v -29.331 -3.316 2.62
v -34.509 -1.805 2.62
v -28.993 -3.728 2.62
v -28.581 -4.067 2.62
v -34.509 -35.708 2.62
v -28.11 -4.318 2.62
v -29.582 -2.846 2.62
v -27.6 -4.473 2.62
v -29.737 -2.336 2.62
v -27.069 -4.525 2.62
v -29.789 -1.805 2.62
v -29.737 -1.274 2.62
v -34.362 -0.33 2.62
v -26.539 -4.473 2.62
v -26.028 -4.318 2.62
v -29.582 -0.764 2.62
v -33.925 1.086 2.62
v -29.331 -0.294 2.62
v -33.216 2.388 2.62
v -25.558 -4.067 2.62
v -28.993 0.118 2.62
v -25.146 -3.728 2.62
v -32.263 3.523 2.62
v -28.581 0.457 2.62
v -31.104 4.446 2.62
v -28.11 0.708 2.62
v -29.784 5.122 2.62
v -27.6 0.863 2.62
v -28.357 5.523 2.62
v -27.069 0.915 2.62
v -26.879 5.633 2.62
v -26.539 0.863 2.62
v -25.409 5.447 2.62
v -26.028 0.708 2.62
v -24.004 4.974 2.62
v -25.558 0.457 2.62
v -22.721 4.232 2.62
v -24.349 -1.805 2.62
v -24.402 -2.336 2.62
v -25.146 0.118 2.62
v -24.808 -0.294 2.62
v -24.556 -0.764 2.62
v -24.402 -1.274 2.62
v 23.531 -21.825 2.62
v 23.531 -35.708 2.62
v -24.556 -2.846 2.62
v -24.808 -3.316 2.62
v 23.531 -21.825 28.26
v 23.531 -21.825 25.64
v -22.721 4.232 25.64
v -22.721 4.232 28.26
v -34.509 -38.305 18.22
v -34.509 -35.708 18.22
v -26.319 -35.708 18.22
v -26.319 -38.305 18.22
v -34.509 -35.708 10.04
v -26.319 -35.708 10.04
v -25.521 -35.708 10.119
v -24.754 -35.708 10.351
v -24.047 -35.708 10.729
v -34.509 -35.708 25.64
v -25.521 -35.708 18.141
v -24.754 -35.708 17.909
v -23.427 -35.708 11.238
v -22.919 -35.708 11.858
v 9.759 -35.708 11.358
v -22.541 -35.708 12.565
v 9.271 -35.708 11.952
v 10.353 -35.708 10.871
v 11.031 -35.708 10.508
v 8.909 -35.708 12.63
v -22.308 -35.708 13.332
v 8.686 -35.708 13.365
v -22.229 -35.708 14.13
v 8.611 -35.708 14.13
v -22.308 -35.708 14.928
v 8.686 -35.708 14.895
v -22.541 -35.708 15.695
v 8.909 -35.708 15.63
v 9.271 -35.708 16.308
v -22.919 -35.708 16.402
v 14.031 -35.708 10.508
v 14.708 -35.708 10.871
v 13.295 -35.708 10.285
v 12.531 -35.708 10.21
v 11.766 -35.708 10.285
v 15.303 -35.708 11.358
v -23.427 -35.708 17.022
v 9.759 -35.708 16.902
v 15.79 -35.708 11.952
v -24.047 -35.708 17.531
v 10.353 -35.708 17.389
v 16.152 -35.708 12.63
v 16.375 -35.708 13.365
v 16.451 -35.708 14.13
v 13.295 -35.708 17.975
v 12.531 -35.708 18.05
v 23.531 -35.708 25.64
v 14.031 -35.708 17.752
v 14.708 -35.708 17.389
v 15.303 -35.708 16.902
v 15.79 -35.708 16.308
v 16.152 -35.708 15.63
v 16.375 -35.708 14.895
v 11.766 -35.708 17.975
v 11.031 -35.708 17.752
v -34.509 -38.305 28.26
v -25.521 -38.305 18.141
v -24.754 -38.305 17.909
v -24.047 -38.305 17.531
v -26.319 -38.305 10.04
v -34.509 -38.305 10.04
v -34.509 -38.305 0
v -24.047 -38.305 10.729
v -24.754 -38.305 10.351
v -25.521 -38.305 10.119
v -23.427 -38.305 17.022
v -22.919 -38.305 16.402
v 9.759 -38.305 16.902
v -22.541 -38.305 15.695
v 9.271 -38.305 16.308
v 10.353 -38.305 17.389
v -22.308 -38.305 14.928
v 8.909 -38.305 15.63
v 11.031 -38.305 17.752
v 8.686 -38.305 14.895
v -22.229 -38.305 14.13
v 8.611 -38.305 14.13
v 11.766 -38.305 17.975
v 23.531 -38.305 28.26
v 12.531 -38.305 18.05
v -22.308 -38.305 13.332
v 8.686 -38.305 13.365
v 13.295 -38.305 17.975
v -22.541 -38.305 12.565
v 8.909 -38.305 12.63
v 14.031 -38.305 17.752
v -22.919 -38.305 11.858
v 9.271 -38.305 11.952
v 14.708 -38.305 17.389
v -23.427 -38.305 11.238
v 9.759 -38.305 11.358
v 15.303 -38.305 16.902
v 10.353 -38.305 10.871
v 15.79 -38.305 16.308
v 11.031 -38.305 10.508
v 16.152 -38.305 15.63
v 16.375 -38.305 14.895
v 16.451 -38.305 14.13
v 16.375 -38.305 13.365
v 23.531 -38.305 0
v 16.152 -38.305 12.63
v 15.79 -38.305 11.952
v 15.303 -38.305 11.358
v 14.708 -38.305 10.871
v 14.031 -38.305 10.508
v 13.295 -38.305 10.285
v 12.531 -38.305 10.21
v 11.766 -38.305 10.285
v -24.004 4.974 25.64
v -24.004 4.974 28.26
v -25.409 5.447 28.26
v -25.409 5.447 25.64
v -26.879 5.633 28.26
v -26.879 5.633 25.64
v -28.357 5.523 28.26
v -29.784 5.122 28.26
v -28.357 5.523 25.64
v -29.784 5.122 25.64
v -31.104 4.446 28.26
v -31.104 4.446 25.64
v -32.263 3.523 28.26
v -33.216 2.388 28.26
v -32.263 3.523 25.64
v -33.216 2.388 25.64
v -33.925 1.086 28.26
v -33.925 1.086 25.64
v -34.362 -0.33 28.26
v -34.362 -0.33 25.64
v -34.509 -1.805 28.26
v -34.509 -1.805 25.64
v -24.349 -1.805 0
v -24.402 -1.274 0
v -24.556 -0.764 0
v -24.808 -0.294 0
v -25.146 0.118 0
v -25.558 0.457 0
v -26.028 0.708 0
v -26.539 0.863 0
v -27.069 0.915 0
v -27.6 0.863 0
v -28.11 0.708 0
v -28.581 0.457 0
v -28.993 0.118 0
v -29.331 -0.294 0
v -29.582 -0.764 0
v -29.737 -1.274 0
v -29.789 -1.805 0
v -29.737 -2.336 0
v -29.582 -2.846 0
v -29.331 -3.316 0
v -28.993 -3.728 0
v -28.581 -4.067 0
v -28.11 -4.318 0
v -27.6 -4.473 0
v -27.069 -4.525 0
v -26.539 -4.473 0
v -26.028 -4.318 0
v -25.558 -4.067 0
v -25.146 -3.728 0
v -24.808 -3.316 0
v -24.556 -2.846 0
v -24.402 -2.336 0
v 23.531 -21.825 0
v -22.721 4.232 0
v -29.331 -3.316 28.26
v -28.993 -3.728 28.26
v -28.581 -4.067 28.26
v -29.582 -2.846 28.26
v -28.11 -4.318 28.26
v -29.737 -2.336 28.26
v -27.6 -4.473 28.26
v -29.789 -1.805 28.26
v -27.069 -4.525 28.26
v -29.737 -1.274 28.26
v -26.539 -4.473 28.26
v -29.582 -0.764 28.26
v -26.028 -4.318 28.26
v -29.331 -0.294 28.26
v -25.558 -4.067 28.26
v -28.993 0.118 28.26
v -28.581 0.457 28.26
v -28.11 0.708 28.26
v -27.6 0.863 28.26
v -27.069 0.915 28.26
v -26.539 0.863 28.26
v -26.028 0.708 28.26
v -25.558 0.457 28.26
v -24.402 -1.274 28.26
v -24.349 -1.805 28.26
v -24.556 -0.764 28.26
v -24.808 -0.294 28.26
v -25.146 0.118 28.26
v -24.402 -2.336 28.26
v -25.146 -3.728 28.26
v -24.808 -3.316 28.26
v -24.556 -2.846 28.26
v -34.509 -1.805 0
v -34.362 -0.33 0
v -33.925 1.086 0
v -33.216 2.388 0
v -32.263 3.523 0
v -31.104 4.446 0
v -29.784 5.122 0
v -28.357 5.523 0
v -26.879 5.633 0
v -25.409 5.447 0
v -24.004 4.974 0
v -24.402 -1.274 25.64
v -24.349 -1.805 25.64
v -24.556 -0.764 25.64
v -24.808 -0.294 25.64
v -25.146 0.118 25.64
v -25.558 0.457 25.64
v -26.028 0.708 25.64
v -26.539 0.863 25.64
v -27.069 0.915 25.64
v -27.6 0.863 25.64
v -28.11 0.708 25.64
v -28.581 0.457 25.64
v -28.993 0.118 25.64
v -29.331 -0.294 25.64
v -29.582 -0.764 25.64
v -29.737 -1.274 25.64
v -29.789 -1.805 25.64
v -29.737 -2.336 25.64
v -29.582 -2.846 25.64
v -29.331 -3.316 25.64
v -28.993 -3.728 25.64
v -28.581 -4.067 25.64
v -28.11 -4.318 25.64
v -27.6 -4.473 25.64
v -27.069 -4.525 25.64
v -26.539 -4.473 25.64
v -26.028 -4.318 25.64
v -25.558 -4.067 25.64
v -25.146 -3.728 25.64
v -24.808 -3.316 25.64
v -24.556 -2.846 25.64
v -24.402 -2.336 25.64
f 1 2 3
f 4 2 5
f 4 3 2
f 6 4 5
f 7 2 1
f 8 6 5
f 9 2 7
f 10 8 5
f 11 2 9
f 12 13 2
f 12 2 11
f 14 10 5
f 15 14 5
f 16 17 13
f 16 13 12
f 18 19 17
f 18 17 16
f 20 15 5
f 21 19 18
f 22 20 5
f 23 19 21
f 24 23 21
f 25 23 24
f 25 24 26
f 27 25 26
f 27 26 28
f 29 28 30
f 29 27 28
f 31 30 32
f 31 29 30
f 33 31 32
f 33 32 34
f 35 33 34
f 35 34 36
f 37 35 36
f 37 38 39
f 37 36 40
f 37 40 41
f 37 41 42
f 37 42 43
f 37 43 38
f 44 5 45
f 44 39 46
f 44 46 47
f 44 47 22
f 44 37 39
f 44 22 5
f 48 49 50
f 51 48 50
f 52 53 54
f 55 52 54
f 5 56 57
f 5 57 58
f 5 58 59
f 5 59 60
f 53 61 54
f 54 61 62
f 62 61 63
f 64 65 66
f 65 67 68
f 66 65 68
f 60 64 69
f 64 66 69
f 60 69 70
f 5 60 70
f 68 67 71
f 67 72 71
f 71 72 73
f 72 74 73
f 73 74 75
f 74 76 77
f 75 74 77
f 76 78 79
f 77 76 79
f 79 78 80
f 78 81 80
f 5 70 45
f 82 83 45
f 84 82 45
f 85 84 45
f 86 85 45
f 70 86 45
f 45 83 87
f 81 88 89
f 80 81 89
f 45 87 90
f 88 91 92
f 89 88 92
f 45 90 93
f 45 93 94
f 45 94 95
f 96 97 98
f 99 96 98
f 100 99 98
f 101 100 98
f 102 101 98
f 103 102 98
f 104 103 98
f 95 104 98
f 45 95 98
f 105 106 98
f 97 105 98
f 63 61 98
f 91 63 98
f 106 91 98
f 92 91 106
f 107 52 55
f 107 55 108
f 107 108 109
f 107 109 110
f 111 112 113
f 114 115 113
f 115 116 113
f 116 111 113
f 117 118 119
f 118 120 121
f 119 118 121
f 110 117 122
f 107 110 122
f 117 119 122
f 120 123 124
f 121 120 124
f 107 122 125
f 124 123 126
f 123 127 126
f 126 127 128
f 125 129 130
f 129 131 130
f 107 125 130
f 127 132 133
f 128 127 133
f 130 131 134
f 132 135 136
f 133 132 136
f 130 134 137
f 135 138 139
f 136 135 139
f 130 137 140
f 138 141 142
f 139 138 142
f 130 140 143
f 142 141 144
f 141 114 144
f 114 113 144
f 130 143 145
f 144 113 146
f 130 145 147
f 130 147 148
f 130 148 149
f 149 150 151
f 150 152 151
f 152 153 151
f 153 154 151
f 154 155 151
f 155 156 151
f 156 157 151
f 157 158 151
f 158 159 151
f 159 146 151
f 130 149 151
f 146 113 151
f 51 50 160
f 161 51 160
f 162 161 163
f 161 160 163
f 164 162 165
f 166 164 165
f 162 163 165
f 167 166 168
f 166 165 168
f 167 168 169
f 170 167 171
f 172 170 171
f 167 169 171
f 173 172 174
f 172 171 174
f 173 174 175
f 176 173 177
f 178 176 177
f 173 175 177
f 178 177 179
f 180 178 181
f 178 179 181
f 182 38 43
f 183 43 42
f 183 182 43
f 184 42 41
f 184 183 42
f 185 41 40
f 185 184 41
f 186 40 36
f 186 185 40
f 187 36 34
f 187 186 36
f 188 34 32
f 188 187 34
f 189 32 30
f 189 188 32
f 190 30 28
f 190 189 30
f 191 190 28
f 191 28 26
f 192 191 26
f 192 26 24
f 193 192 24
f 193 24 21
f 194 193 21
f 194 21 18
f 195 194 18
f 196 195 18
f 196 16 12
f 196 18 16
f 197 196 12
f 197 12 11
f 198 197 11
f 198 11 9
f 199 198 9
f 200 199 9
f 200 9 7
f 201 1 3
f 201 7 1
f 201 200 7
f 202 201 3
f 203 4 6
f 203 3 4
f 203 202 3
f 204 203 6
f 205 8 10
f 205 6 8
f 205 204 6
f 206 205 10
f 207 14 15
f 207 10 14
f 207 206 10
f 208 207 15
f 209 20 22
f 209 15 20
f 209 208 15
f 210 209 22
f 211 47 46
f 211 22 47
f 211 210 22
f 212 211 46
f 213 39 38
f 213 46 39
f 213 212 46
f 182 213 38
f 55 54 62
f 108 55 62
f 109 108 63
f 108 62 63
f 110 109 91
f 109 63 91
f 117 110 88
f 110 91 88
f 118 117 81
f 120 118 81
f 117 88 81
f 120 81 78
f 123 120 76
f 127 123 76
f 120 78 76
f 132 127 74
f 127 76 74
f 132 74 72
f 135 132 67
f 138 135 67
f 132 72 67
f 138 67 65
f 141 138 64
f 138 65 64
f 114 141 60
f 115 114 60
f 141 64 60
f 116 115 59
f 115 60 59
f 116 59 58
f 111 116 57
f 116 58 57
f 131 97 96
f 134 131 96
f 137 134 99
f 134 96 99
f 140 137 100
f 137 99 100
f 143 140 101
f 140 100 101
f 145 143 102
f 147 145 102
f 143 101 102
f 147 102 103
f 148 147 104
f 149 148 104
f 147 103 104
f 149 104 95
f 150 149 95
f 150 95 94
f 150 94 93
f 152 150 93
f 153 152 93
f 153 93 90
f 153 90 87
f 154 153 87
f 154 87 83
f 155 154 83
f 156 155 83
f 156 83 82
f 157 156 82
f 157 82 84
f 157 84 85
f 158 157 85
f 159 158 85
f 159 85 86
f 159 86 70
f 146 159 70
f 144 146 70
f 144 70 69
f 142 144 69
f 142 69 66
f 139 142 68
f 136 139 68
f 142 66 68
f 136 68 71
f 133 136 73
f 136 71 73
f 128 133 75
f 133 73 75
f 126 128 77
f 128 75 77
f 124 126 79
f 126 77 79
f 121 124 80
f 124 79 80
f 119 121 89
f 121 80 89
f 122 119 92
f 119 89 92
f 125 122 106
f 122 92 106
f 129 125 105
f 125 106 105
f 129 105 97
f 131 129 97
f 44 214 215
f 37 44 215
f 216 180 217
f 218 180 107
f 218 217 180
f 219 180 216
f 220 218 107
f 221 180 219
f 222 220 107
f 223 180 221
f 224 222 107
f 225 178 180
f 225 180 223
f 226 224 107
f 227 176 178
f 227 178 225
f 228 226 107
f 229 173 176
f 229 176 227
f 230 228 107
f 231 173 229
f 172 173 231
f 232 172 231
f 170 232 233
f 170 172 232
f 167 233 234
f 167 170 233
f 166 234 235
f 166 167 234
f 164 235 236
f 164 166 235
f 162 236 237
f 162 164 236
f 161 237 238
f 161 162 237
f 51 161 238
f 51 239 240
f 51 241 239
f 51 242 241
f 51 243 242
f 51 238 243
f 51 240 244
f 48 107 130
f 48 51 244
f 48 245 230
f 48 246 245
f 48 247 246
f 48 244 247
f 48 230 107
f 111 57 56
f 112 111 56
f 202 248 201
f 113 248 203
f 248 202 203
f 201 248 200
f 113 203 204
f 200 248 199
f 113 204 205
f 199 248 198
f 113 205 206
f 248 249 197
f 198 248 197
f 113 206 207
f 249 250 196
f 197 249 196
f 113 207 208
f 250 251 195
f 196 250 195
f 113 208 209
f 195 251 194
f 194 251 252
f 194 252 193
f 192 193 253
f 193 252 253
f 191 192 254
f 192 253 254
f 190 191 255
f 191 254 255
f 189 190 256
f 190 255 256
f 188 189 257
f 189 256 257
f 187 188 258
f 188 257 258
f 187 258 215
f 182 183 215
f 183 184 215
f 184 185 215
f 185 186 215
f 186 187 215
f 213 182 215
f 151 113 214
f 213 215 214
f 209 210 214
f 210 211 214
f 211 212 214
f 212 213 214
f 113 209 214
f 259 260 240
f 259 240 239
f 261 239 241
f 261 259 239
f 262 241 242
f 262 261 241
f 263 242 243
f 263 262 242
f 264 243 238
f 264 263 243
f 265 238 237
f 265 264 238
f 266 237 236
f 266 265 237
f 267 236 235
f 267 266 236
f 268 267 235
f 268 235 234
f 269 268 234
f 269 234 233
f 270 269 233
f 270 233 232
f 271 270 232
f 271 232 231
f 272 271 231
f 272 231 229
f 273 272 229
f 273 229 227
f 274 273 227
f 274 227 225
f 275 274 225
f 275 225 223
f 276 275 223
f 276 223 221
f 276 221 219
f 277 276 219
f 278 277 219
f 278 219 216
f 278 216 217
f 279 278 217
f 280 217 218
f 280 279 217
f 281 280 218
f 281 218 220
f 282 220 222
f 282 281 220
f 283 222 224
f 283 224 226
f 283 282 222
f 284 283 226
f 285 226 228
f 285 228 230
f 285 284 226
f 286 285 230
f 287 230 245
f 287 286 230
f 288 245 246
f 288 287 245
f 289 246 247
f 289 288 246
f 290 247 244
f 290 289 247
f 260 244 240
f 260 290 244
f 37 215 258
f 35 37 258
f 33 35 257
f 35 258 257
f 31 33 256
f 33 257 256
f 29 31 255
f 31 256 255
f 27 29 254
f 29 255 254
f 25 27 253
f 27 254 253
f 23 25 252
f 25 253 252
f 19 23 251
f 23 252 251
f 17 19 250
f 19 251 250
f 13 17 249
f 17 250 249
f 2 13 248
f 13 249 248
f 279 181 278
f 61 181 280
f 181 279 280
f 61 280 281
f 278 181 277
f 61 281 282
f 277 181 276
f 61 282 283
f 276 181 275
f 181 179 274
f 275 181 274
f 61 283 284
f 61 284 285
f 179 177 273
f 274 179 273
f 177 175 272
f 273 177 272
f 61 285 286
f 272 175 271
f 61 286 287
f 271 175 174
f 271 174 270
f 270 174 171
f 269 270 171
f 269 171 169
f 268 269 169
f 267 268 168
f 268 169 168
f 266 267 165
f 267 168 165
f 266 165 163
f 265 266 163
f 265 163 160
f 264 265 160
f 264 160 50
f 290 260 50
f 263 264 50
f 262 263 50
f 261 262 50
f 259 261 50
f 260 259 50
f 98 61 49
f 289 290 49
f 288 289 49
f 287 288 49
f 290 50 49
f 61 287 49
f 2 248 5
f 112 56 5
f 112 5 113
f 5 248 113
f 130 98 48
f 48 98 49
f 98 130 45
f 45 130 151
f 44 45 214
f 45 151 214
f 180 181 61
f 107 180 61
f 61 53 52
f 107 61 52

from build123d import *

# Parameters (mm, degrees)
SKETCH_1_R          = 2.72
EXTRUDE_4_DEPTH     = 28.26
CUT_EXTRUDE_1_DEPTH = 11.51
SKETCH_3_R          = 3.92
CUT_EXTRUDE_2_DEPTH = 10


with BuildPart() as part:
    # 草图1 → 凸台-拉伸4 (new body)
    with BuildSketch(Plane.XY):
        with BuildLine():
            Line((-34.509354159, -1.804921221), (-34.509354159, -38.304921221))
            Line((-34.509354159, -38.304921221), (23.530645841, -38.304921221))
            Line((23.530645841, -38.304921221), (23.530645841, -21.824921221))
            Line((23.530645841, -21.824921221), (-22.721234155, 4.232251332))
            ThreePointArc((-22.721234155, 4.232251332), (-30.46078359, 4.817148427), (-34.509354159, -1.804921221))
        make_face()
        with Locations((-27.069354159, -1.804921221)):
            Circle(SKETCH_1_R, mode=Mode.SUBTRACT)
    extrude(amount=EXTRUDE_4_DEPTH)

    # 草图2 → 切除-拉伸1 (cut, symmetric)
    with BuildSketch(Plane.XY.offset(14.13)):
        with BuildLine():
            Line((-35.9562977, -0.339763977), (-37.696904617, -35.707625719))
            Line((-37.696904617, -35.707625719), (23.935381019, -35.707625719))
            Line((23.935381019, -35.707625719), (23.935381019, -19.579879512))
            Line((23.935381019, -19.579879512), (-18.750112631, 5.187829847))
            ThreePointArc((-18.750112631, 5.187829847), (-29.978908557, 10.597270683), (-35.9562977, -0.339763977))
        make_face()
    extrude(amount=CUT_EXTRUDE_1_DEPTH, both=True, mode=Mode.SUBTRACT)

    # 草图3 → 切除-拉伸2 (cut)
    with BuildSketch(Plane(origin=(0, -35.707625719, 0), x_dir=(1, 0, 0), z_dir=(0, 1, 0))):
        with Locations(Location((12.530645841, -14.13, 0), (0, 0, 270))):
            Circle(SKETCH_3_R)
        with BuildLine():
            ThreePointArc((-26.319354159, -18.22), (-22.229354159, -14.13), (-26.319354159, -10.04))
            Line((-26.319354159, -10.04), (-34.509354159, -10.04))
            Line((-34.509354159, -10.04), (-34.509354159, -18.22))
            Line((-34.509354159, -18.22), (-26.319354159, -18.22))
        make_face()
    extrude(amount=-CUT_EXTRUDE_2_DEPTH, mode=Mode.SUBTRACT)


solid = part.part
